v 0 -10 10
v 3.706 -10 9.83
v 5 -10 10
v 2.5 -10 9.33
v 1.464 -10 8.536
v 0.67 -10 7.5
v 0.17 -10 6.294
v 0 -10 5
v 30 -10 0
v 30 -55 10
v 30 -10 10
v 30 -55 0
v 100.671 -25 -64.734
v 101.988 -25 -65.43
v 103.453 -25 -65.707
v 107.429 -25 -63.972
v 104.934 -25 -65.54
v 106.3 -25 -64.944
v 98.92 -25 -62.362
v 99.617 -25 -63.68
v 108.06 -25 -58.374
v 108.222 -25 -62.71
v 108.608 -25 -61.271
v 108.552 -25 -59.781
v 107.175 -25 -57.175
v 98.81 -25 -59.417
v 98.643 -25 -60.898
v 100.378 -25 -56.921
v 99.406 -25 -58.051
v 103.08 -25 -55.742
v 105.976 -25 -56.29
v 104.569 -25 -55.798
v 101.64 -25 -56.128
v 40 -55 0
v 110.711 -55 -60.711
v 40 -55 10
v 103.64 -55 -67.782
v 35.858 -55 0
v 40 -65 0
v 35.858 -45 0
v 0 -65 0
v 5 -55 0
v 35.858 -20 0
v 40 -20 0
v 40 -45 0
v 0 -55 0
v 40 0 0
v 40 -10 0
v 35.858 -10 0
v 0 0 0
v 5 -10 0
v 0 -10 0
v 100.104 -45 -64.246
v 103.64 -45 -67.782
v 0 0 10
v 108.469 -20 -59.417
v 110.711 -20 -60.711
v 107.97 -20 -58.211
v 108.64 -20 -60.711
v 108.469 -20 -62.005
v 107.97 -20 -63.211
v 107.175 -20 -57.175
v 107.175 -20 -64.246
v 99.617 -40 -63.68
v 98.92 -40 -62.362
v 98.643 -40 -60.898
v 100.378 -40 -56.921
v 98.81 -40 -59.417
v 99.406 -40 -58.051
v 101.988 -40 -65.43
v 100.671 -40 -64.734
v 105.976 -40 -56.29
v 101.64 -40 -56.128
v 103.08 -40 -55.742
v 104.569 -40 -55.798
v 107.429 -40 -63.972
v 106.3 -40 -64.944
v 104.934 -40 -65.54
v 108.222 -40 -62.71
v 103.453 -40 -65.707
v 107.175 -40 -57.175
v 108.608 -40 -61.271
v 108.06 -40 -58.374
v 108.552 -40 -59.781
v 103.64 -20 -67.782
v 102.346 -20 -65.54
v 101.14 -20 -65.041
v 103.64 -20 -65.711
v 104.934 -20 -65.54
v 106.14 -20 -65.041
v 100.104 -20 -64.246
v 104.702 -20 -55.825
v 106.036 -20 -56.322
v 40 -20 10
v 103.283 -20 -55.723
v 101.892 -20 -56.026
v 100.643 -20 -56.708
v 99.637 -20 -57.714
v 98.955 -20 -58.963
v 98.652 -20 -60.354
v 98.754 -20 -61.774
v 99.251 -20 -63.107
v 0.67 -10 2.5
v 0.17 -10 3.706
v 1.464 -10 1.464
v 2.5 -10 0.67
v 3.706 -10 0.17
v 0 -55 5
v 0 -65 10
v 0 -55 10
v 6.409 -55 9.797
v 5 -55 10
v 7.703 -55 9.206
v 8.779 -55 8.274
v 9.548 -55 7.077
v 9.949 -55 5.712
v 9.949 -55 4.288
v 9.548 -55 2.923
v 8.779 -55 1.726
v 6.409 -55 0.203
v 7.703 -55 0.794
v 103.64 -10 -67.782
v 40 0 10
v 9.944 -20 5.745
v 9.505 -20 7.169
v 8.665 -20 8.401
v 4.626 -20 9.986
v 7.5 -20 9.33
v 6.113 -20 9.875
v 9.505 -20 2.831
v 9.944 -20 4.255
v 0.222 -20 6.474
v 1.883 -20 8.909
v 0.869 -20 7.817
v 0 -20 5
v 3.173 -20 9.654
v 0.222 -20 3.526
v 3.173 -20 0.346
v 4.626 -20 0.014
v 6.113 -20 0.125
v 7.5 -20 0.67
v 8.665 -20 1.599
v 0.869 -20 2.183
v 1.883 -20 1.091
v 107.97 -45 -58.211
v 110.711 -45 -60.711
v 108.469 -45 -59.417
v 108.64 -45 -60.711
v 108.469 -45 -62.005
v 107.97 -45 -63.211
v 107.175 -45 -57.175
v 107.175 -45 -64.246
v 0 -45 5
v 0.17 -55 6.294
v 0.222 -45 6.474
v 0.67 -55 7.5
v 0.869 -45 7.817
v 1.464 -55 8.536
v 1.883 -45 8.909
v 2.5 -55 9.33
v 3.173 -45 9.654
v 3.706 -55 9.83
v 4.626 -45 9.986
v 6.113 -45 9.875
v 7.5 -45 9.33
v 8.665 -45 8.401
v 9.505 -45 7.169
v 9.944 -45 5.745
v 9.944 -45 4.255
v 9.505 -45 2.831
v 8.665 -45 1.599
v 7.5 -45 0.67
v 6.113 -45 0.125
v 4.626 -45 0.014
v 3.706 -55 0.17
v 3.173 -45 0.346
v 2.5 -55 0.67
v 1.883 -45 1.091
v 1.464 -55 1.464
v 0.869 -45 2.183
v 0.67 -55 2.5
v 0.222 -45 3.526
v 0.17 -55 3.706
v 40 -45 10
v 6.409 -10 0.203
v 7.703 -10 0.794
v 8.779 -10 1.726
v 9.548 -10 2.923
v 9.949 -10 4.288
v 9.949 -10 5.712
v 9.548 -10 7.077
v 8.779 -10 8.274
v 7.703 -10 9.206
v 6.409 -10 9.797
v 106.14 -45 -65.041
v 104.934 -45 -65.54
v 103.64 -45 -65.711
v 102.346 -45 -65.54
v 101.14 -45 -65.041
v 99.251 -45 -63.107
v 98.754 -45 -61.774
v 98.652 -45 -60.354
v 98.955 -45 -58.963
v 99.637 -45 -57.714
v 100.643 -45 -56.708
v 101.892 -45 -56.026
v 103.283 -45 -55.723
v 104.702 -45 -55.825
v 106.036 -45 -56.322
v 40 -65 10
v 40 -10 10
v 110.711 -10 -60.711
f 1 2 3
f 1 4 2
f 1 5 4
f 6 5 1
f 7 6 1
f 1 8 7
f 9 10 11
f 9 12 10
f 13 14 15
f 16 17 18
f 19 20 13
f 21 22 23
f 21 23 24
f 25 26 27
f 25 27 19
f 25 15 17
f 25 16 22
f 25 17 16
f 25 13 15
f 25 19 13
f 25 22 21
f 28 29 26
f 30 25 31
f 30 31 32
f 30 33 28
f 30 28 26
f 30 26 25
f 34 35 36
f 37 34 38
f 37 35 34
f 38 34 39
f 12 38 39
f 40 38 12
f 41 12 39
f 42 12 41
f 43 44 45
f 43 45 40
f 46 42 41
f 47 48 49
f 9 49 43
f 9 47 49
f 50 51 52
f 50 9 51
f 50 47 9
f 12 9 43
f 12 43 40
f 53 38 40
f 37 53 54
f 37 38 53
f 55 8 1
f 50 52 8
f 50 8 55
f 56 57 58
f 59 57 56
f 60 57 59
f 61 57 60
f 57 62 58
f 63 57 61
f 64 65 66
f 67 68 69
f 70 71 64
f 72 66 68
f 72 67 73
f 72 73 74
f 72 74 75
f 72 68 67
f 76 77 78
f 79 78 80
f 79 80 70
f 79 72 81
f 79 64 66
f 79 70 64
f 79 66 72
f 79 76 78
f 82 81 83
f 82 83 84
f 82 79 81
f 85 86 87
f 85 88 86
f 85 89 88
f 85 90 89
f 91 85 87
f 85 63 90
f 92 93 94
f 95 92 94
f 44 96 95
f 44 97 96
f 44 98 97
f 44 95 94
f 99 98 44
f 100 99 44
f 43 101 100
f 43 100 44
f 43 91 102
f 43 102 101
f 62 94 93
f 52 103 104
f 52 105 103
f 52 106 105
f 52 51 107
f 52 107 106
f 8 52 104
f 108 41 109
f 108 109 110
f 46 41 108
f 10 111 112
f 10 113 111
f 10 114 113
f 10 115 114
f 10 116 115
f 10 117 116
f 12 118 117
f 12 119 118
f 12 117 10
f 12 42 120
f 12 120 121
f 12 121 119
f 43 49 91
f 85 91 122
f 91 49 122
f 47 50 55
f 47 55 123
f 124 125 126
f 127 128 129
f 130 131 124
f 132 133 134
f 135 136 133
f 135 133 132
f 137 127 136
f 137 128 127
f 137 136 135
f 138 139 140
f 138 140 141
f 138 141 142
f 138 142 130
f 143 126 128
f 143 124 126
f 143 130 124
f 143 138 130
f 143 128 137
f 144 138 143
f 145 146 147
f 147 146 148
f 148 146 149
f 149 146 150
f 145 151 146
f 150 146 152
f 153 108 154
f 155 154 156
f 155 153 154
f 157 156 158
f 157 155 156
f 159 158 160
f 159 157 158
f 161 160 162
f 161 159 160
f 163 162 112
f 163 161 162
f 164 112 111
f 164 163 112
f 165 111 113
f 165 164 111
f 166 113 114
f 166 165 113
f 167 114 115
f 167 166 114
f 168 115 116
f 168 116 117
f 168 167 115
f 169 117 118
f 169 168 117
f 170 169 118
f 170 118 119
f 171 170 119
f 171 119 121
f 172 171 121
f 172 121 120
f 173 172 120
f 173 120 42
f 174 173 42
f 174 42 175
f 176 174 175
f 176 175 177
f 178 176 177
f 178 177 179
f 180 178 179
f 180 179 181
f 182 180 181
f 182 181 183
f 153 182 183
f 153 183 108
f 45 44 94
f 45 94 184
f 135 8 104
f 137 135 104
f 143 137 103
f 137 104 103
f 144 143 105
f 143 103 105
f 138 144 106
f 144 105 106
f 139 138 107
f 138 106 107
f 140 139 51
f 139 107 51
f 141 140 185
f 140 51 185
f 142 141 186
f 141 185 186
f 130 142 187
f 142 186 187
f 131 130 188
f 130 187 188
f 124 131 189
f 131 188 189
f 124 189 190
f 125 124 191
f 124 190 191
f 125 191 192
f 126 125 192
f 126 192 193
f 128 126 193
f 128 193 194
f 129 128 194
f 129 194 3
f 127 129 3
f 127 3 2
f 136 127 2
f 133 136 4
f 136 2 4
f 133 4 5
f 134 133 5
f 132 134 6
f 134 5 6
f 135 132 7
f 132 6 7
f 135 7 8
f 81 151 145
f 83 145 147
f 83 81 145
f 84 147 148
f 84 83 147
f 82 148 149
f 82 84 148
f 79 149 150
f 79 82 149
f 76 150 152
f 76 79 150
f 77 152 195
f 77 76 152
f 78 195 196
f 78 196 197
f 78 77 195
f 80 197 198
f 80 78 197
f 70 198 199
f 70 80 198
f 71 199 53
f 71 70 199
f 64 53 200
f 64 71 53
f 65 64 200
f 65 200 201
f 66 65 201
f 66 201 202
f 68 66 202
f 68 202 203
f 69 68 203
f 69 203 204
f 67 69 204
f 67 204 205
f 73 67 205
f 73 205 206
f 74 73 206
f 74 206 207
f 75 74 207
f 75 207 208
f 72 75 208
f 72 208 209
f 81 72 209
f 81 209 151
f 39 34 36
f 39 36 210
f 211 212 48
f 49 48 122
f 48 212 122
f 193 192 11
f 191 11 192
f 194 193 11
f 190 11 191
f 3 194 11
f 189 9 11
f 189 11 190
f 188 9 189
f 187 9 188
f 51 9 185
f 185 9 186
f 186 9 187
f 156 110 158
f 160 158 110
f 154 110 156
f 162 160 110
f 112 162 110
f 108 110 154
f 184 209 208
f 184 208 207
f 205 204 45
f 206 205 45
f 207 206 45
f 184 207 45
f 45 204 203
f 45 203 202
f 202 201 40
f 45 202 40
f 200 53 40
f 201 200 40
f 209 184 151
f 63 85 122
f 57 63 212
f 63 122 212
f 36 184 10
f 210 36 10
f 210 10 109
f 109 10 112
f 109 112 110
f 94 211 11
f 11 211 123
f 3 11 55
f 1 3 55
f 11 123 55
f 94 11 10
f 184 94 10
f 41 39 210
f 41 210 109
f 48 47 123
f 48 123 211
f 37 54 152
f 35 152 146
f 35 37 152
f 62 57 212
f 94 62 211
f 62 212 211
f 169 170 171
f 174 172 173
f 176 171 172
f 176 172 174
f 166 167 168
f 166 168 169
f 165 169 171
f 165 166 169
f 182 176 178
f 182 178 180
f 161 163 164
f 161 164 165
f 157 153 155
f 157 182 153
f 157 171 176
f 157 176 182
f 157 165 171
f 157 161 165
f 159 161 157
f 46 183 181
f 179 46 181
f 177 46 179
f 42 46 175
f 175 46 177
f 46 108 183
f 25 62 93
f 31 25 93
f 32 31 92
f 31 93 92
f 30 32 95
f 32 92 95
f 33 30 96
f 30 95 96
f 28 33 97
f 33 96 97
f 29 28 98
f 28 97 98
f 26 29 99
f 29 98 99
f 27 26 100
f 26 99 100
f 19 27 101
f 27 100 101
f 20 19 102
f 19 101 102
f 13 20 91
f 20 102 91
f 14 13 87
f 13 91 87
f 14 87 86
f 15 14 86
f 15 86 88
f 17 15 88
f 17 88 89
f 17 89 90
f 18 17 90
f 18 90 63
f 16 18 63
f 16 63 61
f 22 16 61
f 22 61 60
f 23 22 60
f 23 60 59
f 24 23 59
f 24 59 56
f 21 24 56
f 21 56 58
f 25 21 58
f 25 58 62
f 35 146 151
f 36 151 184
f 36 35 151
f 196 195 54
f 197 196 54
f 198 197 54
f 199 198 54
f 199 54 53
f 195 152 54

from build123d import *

# Parameters (mm, degrees)
SALIENTE_EXTRUIR1_DEPTH = 10
CROQUIS2_R              = 5
SALIENTE_EXTRUIR4_DEPTH = 10
SALIENTE_EXTRUIR5_START = 10
CROQUIS4_R              = 5
SALIENTE_EXTRUIR5_DEPTH = 10
SALIENTE_EXTRUIR7_START = -10
SALIENTE_EXTRUIR7_DEPTH = 10
CROQUIS8_R              = 5
SALIENTE_EXTRUIR8_DEPTH = 5
SALIENTE_EXTRUIR9_START = 5
CROQUIS10_R             = 5
SALIENTE_EXTRUIR9_DEPTH = 5


with BuildPart() as part:
    # Croquis1 → Saliente-Extruir1 (new body)
    with BuildSketch(Plane.XY):
        Polygon((0, 0), (40, 0), (40, -65), (0, -65), (0, -55), (30, -55), (30, -10), (0, -10), align=None)
    extrude(amount=SALIENTE_EXTRUIR1_DEPTH)

    # Croquis2 → Saliente-Extruir4 (add)
    with BuildSketch(Plane.XZ.offset(10)):
        with Locations(Location((5, 5, 0), (0, 0, 180))):
            Circle(CROQUIS2_R)
    extrude(amount=SALIENTE_EXTRUIR4_DEPTH)

    # Croquis4 → Saliente-Extruir5 (add)
    with BuildSketch(Plane(origin=(0, -55, 0), x_dir=(1, 0, 0), z_dir=(0, 1, 0)).offset(SALIENTE_EXTRUIR5_START)):
        with Locations(Location((5, -5, 0), (0, 0, 180))):
            Circle(CROQUIS4_R)
    extrude(amount=-SALIENTE_EXTRUIR5_DEPTH)

    # Croquis7 → Saliente-Extruir7 (add)
    with BuildSketch(Plane(origin=(0, 0, 0), x_dir=(1, 0, 0), z_dir=(0, 1, 0)).offset(SALIENTE_EXTRUIR7_START)):
        Polygon((30, -5.857864376), (103.639610307, 67.781745931), (110.710678119, 60.710678119), (40, -10), (30, -10), align=None)
    saliente_extruir7 = extrude(amount=-SALIENTE_EXTRUIR7_DEPTH)

    # Simetría1: Saliente-Extruir7 across plane
    add(saliente_extruir7.mirror(Plane.ZX.offset(-32.5)))

    # Croquis8 → Saliente-Extruir8 (add)
    with BuildSketch(Plane.XZ.offset(20)):
        with Locations(Location((103.639610307, -60.710678119, 0), (0, 0, 45))):
            Circle(CROQUIS8_R)
    extrude(amount=SALIENTE_EXTRUIR8_DEPTH)

    # Croquis10 → Saliente-Extruir9 (add)
    with BuildSketch(Plane(origin=(0, -45, 0), x_dir=(1, 0, 0), z_dir=(0, 1, 0)).offset(SALIENTE_EXTRUIR9_START)):
        with Locations(Location((103.639610307, 60.710678119, 0), (0, 0, 315))):
            Circle(CROQUIS10_R)
    extrude(amount=-SALIENTE_EXTRUIR9_DEPTH)


solid = part.part
